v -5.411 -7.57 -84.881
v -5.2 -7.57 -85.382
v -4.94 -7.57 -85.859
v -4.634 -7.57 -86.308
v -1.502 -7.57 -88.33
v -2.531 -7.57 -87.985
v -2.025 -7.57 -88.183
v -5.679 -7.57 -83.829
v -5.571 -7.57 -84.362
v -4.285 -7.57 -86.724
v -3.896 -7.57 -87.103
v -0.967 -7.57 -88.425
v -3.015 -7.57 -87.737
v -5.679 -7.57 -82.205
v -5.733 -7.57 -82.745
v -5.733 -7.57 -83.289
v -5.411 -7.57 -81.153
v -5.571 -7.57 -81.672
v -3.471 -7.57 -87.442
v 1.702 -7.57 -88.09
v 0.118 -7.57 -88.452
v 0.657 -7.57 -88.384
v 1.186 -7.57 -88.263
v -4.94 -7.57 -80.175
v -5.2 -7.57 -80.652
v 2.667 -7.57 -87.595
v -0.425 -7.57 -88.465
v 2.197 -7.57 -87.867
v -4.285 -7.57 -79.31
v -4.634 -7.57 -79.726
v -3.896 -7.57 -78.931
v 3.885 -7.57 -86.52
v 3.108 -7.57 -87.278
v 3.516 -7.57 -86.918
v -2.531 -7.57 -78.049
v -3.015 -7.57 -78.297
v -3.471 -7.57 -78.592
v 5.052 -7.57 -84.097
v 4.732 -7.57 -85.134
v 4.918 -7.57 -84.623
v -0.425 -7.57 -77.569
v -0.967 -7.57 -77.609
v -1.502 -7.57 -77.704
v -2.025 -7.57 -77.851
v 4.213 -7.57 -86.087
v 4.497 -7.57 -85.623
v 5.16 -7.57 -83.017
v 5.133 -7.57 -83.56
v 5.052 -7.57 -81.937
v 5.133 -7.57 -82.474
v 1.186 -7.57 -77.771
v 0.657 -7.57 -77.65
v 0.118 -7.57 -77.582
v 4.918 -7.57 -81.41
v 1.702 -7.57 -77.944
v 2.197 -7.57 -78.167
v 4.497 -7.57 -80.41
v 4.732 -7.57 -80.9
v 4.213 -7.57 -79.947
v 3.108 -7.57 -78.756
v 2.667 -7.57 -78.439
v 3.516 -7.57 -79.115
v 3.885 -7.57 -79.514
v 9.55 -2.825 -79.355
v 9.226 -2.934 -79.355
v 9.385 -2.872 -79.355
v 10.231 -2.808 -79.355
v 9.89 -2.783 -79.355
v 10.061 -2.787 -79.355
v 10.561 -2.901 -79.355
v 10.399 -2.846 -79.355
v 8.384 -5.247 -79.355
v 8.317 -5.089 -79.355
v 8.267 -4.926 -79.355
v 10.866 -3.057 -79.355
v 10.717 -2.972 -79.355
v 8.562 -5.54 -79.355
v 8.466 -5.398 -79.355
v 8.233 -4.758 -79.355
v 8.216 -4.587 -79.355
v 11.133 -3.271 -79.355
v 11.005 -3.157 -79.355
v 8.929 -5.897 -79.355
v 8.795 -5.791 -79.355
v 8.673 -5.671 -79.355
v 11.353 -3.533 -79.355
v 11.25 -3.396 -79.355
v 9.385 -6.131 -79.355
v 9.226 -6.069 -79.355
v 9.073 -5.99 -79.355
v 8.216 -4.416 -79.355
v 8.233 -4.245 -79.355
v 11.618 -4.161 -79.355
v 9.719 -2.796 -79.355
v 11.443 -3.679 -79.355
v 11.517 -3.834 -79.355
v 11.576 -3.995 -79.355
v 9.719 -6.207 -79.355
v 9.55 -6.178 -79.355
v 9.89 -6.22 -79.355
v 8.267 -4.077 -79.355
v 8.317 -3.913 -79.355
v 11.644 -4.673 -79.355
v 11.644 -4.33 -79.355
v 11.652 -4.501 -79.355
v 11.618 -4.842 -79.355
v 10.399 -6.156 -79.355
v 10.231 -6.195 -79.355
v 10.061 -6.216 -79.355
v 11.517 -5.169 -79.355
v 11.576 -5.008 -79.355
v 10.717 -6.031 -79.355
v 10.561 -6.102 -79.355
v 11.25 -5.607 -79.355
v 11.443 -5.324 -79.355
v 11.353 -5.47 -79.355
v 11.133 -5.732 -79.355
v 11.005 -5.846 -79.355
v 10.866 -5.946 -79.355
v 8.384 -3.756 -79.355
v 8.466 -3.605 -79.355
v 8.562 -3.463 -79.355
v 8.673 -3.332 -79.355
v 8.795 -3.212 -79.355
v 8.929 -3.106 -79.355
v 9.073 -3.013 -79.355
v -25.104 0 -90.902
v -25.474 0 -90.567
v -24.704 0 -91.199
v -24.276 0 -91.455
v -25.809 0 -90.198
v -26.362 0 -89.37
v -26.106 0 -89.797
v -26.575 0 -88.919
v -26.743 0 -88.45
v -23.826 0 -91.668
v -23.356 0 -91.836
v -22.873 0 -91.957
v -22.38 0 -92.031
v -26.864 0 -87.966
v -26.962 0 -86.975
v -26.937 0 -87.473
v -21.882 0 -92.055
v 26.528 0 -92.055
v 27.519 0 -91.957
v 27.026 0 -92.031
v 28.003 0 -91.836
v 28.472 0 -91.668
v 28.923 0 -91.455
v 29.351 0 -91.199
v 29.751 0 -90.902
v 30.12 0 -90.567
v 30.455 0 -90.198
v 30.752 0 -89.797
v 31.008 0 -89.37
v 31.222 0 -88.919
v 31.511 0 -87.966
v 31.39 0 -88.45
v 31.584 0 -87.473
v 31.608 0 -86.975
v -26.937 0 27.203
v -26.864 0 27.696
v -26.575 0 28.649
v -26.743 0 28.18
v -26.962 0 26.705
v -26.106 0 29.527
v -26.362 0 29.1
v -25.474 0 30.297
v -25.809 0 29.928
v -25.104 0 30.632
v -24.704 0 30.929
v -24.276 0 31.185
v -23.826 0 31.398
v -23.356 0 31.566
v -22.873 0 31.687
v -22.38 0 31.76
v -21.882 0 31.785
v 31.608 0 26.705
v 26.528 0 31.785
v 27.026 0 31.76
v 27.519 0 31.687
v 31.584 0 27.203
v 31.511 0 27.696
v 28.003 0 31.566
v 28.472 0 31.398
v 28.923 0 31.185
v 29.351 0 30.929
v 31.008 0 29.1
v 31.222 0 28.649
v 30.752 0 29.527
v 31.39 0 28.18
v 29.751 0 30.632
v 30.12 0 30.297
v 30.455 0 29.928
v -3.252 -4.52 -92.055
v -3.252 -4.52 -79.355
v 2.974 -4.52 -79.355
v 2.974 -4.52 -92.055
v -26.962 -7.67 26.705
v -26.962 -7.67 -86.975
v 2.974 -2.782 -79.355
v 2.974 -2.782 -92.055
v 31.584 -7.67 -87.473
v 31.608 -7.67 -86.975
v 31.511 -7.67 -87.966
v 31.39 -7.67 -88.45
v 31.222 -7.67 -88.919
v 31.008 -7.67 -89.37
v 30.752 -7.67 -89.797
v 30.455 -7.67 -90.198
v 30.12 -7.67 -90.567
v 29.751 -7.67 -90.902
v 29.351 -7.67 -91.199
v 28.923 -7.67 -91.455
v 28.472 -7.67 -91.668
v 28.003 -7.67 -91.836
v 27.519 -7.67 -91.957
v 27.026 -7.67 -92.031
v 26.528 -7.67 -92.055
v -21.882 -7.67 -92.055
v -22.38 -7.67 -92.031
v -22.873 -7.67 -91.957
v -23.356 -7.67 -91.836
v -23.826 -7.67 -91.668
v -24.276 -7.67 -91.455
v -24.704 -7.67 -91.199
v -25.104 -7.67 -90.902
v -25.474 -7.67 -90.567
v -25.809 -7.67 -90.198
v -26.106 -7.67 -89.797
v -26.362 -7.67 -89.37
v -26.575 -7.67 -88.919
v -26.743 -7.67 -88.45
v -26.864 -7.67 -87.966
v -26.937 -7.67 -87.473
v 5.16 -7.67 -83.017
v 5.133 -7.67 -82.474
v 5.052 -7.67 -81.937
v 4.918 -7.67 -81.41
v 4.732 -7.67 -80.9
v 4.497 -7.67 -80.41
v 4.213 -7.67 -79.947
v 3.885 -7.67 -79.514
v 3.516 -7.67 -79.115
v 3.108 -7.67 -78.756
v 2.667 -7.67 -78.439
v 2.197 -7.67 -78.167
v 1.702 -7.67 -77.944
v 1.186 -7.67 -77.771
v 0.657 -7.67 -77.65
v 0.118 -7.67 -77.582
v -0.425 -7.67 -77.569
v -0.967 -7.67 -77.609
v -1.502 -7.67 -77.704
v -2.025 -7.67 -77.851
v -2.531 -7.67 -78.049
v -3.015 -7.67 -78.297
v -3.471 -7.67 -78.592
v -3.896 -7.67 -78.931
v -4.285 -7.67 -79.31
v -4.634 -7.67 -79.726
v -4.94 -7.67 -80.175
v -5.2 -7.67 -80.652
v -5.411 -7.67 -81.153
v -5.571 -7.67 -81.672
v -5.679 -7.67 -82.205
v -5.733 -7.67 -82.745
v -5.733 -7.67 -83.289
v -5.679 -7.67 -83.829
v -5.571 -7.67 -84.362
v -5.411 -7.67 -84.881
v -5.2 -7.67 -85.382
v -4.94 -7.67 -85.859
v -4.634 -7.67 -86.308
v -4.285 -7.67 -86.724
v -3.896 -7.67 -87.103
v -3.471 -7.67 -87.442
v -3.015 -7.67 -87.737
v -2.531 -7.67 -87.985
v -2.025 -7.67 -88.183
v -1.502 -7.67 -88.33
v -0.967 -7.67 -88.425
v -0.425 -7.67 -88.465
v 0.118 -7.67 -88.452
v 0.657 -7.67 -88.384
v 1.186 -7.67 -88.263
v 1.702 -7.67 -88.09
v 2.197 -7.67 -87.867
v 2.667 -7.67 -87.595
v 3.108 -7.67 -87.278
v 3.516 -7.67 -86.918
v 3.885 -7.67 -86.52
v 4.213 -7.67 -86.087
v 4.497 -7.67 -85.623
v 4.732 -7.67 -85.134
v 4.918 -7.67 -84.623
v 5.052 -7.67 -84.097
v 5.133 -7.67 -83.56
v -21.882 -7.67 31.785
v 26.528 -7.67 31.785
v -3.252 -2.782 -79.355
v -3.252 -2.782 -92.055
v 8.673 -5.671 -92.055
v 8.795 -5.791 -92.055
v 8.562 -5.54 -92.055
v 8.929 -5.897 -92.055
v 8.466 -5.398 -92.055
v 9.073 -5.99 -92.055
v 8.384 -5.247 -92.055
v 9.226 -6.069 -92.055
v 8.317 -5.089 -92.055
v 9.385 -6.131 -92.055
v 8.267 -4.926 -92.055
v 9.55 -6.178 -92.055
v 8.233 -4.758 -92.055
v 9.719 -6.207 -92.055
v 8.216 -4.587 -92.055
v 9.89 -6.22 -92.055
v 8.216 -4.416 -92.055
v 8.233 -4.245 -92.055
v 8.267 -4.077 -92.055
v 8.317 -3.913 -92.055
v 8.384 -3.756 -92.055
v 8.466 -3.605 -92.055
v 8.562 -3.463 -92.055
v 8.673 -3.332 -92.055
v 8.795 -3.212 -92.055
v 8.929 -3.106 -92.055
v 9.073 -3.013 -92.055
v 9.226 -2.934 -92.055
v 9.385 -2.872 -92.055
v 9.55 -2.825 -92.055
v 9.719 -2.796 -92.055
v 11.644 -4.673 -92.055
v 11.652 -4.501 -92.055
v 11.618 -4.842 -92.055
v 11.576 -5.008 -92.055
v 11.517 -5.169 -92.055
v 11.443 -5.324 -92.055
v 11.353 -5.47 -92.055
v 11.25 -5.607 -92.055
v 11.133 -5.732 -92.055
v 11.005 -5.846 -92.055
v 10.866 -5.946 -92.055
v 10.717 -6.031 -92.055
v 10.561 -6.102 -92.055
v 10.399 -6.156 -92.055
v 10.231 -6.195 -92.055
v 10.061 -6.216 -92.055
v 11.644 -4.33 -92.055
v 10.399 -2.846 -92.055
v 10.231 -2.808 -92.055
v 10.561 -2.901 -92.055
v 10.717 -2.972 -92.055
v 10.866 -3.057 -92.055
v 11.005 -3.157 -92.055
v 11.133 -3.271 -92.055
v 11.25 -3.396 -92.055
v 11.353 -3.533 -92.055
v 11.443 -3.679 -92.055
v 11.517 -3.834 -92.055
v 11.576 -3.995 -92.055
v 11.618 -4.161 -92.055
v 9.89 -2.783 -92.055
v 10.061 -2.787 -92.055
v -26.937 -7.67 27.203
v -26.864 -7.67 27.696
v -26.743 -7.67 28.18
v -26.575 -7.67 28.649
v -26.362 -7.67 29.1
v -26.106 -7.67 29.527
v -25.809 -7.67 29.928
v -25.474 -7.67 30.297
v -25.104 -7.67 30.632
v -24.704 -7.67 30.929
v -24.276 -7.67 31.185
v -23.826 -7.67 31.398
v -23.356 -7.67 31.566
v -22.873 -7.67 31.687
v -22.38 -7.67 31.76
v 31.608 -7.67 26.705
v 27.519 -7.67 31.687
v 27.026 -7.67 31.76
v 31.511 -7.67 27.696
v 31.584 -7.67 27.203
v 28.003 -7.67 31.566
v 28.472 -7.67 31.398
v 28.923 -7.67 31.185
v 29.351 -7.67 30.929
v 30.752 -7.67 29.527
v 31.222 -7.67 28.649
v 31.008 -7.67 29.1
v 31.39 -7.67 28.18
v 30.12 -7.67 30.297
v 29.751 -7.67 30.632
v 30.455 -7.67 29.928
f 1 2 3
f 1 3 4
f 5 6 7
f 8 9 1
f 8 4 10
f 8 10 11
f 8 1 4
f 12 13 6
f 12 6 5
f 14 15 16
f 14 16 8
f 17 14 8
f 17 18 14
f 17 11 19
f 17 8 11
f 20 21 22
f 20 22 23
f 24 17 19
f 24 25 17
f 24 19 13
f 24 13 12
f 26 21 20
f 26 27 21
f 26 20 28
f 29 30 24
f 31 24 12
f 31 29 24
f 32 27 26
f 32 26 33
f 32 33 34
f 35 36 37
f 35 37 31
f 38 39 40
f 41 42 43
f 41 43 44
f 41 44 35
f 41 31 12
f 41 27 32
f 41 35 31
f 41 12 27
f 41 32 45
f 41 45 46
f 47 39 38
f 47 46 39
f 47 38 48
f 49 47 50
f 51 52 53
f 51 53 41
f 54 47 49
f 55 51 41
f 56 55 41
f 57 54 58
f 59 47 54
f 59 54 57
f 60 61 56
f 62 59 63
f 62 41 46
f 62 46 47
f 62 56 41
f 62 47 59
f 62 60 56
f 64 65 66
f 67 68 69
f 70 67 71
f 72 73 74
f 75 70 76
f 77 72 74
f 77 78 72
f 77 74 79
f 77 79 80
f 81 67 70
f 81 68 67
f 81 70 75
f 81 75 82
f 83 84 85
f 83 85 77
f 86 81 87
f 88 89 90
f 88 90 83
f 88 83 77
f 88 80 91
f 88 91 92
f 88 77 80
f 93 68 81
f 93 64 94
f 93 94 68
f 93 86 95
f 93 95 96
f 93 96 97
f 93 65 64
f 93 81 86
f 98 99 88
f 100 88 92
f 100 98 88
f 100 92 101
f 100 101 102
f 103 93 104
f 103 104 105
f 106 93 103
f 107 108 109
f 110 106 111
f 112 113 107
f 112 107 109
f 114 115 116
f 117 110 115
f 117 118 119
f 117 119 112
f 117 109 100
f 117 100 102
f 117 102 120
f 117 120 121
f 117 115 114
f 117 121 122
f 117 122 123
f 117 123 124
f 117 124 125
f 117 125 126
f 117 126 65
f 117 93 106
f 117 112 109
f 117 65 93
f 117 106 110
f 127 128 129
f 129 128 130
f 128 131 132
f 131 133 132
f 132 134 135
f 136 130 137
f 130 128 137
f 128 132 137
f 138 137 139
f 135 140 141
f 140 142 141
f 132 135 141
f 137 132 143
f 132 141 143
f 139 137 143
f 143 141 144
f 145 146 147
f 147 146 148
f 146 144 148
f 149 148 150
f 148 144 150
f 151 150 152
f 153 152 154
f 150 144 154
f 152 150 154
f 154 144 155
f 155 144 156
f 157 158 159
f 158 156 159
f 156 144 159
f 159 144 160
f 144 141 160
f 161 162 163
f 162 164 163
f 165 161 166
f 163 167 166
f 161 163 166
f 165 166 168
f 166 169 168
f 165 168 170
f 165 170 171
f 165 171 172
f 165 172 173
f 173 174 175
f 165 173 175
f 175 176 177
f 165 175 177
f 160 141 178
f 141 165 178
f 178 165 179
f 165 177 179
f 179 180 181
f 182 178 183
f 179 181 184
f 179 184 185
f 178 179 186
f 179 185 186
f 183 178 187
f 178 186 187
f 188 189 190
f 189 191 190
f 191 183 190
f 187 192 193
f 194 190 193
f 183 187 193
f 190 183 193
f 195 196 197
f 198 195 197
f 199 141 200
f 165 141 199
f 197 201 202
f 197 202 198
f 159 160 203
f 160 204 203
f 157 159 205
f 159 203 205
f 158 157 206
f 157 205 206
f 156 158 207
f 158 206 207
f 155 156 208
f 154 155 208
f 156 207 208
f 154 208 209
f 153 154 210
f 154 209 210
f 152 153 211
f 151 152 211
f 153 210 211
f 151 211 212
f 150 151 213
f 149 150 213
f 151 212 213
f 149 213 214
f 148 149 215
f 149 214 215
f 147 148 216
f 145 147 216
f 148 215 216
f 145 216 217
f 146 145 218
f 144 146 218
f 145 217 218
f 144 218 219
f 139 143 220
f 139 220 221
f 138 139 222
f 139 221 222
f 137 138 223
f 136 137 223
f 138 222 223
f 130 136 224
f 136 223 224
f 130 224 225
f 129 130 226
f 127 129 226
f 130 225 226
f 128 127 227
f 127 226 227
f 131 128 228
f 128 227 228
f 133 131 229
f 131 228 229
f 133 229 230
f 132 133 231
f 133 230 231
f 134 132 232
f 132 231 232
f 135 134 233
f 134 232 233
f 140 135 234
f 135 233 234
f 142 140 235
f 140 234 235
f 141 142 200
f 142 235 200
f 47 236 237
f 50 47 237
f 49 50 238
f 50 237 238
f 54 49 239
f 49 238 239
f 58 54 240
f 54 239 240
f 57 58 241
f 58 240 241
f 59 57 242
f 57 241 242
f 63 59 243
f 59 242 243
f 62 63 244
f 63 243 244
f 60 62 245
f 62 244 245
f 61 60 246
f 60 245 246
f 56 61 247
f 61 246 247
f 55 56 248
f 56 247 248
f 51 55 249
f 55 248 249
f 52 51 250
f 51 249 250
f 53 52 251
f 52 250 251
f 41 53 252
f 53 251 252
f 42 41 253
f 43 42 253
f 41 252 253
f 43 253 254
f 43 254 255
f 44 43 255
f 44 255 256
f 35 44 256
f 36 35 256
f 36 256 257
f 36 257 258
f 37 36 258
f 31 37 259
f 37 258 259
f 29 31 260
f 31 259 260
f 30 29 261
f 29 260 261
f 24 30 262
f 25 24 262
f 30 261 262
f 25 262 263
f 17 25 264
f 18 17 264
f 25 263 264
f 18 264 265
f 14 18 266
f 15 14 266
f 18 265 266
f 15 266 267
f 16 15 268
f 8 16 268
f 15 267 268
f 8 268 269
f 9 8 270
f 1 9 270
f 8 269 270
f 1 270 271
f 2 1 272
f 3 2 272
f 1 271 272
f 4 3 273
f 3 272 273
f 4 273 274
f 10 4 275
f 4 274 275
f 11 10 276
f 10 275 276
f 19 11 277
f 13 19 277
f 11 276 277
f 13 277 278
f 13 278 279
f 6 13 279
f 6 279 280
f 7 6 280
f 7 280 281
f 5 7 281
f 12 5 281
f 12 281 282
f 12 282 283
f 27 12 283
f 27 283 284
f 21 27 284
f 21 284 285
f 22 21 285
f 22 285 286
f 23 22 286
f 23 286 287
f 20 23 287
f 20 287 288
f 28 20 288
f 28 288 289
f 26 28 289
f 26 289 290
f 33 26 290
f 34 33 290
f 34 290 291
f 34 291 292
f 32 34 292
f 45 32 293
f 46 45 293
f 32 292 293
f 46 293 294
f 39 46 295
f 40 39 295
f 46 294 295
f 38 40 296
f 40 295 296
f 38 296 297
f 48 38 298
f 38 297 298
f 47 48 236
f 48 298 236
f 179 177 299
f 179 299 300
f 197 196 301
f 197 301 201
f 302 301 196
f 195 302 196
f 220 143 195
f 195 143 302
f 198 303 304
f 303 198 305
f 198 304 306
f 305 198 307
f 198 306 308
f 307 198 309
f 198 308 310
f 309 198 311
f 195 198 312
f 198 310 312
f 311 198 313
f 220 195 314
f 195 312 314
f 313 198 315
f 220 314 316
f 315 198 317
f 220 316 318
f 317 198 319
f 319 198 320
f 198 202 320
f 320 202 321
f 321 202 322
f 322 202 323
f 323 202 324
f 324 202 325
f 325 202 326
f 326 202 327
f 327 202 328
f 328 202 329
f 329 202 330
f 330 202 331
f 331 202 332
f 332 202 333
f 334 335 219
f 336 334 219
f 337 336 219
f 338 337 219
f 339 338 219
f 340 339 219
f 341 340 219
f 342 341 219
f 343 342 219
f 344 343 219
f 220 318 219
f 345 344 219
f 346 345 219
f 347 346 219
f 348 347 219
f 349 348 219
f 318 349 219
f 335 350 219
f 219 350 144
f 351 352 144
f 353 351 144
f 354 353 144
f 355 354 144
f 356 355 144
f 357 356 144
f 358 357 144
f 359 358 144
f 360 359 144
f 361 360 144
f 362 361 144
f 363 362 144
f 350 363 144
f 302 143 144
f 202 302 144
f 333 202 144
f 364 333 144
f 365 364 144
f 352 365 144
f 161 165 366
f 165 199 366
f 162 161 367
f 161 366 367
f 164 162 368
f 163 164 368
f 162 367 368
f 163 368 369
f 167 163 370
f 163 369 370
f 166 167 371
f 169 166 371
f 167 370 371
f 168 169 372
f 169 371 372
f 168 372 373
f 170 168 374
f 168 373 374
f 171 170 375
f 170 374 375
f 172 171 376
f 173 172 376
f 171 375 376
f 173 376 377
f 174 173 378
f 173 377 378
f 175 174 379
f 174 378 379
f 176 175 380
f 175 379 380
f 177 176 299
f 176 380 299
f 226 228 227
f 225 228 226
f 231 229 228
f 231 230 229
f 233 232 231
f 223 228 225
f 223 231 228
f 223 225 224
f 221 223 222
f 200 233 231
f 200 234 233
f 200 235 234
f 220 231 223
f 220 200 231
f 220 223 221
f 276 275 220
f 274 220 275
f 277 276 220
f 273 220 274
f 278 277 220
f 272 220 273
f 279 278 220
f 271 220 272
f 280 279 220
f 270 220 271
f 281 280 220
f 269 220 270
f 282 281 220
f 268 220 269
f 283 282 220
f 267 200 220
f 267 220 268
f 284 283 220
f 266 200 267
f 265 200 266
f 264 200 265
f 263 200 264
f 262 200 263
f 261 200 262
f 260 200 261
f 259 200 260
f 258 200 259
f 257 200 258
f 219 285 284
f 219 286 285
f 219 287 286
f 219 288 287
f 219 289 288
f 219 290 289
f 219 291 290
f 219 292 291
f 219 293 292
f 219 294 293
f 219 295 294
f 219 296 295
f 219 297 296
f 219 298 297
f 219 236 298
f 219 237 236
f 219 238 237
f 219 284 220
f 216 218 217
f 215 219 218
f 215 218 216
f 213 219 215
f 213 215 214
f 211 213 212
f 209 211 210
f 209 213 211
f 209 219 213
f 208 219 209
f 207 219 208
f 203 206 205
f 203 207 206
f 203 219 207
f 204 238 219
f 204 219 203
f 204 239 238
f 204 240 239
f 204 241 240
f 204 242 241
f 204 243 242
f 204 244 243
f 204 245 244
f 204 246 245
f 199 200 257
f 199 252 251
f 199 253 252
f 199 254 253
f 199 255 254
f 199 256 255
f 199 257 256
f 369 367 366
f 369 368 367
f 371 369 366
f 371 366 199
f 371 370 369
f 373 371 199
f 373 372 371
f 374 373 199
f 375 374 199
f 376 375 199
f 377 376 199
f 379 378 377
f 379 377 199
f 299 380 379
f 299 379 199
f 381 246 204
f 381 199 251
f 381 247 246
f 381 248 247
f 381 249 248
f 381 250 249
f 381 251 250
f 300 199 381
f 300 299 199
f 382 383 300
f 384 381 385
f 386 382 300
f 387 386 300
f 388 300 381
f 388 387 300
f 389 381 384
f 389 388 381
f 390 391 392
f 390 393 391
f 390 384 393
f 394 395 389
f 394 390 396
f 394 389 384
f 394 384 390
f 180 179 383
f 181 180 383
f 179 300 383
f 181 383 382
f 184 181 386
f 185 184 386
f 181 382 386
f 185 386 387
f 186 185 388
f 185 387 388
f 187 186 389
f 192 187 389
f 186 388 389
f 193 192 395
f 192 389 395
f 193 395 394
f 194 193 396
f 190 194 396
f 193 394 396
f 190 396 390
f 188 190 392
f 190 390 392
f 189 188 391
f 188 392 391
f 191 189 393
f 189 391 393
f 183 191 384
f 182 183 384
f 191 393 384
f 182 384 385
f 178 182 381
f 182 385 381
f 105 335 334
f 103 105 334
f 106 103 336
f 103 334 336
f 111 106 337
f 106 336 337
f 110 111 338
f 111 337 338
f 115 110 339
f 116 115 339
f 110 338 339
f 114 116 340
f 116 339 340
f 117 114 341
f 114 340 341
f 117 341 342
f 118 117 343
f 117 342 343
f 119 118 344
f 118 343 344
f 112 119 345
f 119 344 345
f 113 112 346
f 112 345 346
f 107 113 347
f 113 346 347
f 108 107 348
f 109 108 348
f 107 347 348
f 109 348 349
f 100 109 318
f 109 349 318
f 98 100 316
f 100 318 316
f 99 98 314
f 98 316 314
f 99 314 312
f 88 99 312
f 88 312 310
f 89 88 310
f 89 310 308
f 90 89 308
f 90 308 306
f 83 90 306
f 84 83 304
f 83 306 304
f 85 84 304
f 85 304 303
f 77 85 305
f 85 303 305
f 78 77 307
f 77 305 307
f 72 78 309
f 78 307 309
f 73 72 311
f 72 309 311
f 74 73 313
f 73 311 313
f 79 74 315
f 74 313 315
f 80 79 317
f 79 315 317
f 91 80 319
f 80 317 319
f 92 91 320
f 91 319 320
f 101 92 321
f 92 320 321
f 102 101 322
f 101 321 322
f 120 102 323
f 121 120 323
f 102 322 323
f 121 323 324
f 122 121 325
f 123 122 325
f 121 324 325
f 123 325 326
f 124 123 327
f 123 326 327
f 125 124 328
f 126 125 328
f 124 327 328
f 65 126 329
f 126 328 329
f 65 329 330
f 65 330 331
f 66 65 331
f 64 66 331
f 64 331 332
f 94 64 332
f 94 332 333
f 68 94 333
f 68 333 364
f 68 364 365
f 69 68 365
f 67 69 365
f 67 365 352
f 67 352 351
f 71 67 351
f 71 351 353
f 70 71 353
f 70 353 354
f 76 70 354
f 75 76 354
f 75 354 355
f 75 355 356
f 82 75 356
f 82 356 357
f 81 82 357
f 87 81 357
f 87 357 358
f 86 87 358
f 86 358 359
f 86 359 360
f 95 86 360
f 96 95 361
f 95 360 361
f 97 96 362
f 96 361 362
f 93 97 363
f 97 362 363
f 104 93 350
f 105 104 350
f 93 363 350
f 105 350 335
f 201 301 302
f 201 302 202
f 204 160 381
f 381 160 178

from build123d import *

# Parameters (mm, degrees)
F0_W      = 58.57
F0_H      = 123.84
F1_DEPTH  = 7.67
F2_R      = 5.08
F3_R      = 5.08
F4_R      = 5.08
F5_R      = 5.08
F8_W      = 6.225877
F8_H      = 1.738168
F9_DEPTH  = 12.7
F10_R     = 1.719238
F11_DEPTH = 12.7
F7_R      = 5.45
F12_DEPTH = 0.1


with BuildPart() as f1:
    # F0 (on Front) → F1 (new body)
    with BuildSketch(Plane.XZ):
        with Locations((2.323339, -30.135072)):
            Rectangle(F0_W, F0_H)
    extrude(amount=F1_DEPTH)

    # F2
    f2_edges = [f1.edges().sort_by_distance(p)[0] for p in [
        (-26.961661, -3.835, 31.784928),
    ]]
    fillet(f2_edges, radius=F2_R)

    # F3
    f3_edges = [f1.edges().sort_by_distance(p)[0] for p in [
        (31.608339, -3.835, 31.784928),
    ]]
    fillet(f3_edges, radius=F3_R)

    # F4
    f4_edges = [f1.edges().sort_by_distance(p)[0] for p in [
        (31.608339, -3.835, -92.055072),
    ]]
    fillet(f4_edges, radius=F4_R)

    # F5
    f5_edges = [f1.edges().sort_by_distance(p)[0] for p in [
        (-26.961661, -3.835, -92.055072),
    ]]
    fillet(f5_edges, radius=F5_R)

    # F8 (on face) → F9 (cut)
    with BuildSketch(Plane(origin=(0, 0, -92.055072), x_dir=(1, 0, 0), z_dir=(0, 0, -1))):
        with Locations((-0.13871, 3.651316)):
            Rectangle(F8_W, F8_H)
    extrude(amount=-F9_DEPTH, mode=Mode.SUBTRACT)

    # F10 (on face) → F11 (cut)
    with BuildSketch(Plane(origin=(0, 0, -92.055072), x_dir=(1, 0, 0), z_dir=(0, 0, -1))):
        with Locations((9.932925, 4.50147)):
            Circle(F10_R)
    extrude(amount=-F11_DEPTH, mode=Mode.SUBTRACT)

    # F7 (on face) → F12 (cut)
    with BuildSketch(Plane.XZ.offset(7.67)):
        with Locations((-0.289605, -83.01686)):
            Circle(F7_R)
    extrude(amount=-F12_DEPTH, mode=Mode.SUBTRACT)


solid = f1.part
